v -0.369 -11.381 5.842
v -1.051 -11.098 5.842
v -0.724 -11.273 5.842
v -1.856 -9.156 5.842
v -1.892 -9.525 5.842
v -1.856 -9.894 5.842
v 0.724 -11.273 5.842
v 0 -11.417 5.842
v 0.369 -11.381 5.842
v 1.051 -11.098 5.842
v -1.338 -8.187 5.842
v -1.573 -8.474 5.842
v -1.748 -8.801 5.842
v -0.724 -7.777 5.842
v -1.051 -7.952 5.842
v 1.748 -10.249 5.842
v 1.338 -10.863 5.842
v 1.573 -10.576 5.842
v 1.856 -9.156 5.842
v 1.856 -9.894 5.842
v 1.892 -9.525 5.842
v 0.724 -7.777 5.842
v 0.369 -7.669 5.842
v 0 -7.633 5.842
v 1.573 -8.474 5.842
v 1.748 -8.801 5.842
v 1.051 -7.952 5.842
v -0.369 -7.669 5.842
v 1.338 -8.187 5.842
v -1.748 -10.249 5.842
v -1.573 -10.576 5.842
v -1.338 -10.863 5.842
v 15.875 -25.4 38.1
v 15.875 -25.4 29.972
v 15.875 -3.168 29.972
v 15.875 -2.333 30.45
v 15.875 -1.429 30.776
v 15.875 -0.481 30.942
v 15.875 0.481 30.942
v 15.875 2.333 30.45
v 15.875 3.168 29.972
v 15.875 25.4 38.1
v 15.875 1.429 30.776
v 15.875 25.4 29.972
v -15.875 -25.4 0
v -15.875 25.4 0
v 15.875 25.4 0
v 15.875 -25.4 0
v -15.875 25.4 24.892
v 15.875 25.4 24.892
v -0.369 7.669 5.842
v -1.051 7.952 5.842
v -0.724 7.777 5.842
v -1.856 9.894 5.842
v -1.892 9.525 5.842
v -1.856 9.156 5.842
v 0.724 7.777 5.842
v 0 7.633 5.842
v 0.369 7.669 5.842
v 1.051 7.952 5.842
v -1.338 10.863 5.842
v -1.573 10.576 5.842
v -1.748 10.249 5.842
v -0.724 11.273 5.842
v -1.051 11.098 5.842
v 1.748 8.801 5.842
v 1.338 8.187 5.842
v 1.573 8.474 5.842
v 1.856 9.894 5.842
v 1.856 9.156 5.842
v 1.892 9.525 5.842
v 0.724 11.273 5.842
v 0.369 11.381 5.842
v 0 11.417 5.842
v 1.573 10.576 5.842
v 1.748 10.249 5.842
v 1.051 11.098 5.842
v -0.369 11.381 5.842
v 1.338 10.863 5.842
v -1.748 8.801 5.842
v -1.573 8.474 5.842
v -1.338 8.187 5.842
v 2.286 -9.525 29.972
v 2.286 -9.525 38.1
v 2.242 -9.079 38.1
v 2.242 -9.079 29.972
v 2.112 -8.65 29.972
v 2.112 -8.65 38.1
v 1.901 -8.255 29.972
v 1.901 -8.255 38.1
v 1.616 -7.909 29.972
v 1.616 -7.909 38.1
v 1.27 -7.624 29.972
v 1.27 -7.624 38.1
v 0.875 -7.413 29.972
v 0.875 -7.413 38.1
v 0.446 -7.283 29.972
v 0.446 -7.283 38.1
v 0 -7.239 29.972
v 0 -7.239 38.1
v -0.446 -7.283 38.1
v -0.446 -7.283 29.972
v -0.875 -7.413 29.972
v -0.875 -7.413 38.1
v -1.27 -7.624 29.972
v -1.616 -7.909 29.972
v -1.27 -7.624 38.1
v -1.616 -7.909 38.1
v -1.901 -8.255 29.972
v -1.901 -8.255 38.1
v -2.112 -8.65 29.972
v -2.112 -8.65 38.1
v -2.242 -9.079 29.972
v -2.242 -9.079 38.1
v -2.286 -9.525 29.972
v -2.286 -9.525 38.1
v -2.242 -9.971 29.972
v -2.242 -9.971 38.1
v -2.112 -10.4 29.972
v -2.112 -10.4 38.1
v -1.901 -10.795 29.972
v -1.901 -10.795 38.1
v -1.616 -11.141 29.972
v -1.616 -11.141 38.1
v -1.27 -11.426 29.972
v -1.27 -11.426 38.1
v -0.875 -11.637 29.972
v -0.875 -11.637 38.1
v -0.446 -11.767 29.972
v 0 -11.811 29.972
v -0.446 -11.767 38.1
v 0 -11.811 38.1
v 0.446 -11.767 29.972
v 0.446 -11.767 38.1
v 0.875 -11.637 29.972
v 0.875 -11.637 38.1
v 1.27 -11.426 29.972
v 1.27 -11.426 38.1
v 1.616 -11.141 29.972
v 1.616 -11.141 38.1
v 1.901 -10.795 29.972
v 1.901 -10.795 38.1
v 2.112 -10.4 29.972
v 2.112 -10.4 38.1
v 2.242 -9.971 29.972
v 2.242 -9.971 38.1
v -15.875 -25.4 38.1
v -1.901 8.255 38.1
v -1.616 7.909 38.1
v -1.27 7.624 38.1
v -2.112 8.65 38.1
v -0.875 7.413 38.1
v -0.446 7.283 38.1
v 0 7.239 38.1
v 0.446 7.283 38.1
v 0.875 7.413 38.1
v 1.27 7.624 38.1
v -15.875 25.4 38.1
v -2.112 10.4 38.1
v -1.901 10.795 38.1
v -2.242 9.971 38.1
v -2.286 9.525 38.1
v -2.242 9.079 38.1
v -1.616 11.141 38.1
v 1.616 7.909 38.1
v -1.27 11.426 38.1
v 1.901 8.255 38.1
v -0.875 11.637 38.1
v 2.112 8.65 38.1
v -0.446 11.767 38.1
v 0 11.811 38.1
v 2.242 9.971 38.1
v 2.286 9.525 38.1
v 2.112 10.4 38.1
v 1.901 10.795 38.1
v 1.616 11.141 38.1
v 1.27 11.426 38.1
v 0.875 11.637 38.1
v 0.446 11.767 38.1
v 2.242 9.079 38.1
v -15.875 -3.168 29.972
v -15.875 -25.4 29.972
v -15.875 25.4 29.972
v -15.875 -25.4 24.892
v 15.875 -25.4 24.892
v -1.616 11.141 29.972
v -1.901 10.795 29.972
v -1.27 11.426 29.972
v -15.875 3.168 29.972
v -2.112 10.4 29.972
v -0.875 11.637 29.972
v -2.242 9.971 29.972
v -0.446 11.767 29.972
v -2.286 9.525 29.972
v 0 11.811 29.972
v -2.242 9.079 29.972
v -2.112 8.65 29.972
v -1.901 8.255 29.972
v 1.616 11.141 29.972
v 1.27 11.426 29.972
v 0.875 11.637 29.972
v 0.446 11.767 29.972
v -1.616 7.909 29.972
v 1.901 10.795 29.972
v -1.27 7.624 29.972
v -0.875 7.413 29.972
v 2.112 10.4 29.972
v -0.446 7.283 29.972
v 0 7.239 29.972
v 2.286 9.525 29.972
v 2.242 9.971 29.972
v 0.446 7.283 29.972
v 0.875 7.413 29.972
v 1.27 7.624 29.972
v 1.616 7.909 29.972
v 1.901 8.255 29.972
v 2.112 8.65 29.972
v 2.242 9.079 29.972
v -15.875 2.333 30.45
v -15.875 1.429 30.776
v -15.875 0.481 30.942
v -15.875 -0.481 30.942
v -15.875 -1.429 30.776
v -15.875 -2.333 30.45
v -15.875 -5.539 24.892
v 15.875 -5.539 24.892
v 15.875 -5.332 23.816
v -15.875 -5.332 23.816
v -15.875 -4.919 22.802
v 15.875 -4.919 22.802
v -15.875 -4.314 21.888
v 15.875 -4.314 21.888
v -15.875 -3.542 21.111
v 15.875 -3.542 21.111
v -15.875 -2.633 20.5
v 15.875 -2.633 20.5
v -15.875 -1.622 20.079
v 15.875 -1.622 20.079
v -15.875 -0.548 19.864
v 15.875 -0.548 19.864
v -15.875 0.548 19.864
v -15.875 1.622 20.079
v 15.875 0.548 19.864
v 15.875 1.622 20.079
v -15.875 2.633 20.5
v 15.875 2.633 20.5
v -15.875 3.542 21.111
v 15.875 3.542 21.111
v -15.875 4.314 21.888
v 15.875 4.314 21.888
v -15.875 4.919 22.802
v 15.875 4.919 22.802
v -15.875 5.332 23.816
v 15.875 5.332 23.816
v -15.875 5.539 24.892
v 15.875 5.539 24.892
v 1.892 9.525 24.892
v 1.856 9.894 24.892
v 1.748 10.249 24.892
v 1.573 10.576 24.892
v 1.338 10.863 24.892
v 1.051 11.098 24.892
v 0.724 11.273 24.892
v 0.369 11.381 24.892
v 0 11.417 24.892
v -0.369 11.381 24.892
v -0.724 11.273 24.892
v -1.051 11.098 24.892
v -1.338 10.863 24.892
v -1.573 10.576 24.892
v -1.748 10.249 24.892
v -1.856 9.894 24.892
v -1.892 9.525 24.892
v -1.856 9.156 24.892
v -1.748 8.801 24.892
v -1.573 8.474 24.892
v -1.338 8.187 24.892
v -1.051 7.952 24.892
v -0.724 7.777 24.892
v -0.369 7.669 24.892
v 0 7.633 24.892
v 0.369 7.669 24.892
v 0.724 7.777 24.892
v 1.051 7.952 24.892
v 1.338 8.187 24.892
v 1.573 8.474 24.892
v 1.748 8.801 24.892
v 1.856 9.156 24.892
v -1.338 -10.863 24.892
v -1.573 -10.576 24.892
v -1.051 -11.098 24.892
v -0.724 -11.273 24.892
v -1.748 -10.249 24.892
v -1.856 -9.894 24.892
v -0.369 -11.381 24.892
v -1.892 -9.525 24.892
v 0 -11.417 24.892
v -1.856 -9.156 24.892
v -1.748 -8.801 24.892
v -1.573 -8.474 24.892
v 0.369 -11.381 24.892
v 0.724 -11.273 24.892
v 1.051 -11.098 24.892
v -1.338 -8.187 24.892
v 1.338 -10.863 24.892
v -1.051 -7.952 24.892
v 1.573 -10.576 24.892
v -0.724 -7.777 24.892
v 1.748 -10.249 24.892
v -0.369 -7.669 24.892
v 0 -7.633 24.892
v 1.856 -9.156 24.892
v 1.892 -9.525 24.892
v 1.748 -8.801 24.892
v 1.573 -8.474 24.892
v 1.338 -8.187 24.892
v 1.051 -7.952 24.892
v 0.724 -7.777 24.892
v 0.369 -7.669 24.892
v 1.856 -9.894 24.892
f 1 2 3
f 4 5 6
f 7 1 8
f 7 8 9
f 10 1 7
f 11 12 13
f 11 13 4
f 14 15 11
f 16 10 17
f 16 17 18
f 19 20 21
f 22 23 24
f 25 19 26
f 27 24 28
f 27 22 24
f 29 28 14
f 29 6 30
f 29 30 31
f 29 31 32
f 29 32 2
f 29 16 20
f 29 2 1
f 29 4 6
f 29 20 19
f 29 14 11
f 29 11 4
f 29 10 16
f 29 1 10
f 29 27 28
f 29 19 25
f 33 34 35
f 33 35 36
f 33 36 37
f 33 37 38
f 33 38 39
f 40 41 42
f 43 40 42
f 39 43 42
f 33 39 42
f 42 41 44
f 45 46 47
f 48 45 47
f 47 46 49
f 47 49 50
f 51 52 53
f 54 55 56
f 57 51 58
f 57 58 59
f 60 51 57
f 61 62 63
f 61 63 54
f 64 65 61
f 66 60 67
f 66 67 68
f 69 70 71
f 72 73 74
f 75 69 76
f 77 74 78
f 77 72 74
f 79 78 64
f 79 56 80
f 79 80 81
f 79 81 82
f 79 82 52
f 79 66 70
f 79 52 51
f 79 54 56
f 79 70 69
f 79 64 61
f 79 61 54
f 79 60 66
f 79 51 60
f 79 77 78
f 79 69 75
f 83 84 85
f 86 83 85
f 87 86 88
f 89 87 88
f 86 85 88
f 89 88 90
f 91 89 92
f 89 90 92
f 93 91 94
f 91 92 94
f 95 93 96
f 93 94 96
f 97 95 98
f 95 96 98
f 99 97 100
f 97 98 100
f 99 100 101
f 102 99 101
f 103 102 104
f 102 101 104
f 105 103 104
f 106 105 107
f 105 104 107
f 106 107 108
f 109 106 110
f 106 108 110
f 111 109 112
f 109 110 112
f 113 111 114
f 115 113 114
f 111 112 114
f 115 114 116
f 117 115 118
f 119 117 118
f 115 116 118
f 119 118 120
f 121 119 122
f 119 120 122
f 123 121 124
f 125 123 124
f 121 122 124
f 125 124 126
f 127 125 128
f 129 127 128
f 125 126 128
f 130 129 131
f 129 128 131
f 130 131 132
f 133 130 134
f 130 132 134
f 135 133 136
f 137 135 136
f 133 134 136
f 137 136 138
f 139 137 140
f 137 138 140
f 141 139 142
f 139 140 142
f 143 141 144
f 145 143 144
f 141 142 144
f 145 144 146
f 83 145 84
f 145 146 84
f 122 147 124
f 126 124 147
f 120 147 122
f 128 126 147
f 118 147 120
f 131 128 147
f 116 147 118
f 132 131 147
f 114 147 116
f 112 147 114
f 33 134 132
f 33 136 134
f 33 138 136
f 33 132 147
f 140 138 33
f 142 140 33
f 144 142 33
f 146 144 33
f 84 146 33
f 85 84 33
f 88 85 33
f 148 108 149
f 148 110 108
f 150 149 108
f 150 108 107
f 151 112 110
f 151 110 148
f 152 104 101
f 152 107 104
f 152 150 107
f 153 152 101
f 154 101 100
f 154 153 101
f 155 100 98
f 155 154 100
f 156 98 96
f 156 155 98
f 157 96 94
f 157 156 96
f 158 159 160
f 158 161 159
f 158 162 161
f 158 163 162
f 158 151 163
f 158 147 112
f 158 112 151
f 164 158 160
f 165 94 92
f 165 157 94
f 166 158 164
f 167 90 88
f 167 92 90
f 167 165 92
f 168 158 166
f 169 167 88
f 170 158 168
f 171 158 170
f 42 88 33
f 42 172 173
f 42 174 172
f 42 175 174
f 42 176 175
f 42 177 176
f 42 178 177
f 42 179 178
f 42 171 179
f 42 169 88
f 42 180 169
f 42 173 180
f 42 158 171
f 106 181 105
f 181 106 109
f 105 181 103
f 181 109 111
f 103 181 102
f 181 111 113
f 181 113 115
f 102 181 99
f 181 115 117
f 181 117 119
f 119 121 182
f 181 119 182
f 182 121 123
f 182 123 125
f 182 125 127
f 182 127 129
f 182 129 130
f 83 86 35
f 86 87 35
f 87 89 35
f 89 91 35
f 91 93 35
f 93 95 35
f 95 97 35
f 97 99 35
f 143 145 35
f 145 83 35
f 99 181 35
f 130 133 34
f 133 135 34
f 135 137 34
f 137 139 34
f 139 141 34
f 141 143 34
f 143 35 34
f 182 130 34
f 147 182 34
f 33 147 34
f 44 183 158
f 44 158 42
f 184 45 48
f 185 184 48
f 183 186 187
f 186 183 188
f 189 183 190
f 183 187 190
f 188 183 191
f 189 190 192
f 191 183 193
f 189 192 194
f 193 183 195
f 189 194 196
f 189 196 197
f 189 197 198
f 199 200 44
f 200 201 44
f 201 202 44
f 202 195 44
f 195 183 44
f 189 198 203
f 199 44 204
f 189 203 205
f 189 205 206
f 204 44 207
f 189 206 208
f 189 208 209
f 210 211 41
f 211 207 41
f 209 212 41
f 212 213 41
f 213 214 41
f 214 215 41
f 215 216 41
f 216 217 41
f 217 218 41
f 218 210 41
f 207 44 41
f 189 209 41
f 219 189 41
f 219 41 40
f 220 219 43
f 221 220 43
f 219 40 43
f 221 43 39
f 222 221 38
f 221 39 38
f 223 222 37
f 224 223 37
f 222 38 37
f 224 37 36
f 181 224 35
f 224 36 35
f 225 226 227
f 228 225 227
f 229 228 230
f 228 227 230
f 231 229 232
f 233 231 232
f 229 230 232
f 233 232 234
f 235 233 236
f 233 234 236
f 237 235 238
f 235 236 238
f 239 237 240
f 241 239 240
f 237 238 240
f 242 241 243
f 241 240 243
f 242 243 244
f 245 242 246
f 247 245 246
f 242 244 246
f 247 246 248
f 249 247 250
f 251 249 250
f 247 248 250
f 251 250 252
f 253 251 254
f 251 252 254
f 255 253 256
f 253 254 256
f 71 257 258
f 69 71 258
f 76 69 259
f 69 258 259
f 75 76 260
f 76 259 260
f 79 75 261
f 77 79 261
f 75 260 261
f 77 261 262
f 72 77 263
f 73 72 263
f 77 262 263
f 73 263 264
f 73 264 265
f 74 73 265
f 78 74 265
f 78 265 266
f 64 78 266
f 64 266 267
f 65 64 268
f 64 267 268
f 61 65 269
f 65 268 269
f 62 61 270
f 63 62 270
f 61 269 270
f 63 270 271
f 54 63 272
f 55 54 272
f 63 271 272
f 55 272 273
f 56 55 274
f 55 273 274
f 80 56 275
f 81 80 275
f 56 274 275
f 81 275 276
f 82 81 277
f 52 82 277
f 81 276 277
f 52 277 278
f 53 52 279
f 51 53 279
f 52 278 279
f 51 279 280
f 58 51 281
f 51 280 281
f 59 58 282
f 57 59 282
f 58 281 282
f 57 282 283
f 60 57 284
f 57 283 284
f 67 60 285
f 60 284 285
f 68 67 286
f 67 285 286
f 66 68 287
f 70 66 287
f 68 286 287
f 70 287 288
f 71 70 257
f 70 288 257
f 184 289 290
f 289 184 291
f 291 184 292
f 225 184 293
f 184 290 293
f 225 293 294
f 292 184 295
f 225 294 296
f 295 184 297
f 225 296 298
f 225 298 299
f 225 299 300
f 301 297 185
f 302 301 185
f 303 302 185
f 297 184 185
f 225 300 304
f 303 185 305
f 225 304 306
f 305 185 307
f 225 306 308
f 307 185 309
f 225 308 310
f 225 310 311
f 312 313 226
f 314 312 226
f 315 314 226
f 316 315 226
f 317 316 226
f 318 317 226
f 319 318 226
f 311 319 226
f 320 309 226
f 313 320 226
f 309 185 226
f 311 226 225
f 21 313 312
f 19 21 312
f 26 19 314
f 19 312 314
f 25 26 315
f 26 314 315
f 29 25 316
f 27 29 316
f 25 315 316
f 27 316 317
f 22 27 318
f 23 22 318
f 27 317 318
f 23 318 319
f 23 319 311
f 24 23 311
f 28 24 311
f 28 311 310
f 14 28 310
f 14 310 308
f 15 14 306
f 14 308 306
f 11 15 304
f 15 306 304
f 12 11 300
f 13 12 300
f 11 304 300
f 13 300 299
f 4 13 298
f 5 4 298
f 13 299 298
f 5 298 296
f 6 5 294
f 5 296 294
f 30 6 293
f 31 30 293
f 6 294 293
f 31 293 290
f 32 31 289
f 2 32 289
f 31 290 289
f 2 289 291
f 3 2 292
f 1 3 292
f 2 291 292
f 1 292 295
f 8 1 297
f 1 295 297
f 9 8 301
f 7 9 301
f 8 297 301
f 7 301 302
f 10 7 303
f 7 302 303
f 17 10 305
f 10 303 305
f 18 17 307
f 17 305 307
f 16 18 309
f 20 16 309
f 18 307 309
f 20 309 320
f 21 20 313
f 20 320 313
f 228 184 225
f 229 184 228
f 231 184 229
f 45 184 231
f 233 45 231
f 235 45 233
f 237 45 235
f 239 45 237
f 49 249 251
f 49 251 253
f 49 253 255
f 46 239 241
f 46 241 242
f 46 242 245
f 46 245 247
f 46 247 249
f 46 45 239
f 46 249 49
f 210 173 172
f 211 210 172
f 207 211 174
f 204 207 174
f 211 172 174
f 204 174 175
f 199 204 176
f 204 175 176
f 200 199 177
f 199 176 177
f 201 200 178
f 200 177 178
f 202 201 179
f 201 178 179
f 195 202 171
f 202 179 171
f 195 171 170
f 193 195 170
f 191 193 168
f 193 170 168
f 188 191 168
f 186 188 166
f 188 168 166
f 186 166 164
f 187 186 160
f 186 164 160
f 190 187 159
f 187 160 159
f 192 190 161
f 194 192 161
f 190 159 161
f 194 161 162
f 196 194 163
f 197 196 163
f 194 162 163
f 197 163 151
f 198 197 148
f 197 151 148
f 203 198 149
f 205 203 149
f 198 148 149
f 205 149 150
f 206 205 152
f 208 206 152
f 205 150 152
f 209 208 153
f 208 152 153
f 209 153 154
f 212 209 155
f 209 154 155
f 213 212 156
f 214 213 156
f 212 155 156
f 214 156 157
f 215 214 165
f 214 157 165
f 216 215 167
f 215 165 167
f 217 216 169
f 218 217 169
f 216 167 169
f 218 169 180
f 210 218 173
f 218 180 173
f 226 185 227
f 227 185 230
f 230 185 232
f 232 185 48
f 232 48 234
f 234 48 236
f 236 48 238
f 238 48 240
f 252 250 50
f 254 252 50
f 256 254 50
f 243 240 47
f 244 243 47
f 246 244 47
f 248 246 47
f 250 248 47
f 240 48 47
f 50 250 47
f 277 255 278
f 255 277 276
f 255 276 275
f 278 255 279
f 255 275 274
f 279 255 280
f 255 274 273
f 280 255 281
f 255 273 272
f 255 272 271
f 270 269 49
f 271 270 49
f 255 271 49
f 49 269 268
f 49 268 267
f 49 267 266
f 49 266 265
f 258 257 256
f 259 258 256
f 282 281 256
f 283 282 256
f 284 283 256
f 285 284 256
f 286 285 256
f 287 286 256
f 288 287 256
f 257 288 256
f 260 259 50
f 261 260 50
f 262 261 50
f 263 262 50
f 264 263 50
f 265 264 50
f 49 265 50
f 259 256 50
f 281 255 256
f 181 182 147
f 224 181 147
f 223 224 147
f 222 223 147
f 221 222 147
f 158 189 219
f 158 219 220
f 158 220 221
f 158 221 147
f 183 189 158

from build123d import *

# Parameters (mm, degrees)
F0_W     = 31.75
F0_H     = 50.8
F1_DEPTH = 38.1
F3_DEPTH = 31.751
F4_R     = 2.286
F5_DEPTH = 8.128
F6_R     = 1.8923
F7_DEPTH = 19.05


with BuildPart() as f1:
    # F0 (on Top) → F1 (new body)
    with BuildSketch(Plane.XY):
        Rectangle(F0_W, F0_H)
    extrude(amount=F1_DEPTH)

    # F2 (on face) → F3 (cut, through all)
    with BuildSketch(Plane.YZ.offset(15.875)):
        with BuildLine():
            Line((-25.4, 24.892), (-5.539355, 24.892))
            ThreePointArc((-5.539355, 24.892), (0, 19.8374), (5.539355, 24.892))
            Line((5.539355, 24.892), (25.4, 24.892))
            Line((25.4, 24.892), (25.4, 29.972))
            Line((25.4, 29.972), (3.168491, 29.972))
            ThreePointArc((3.168491, 29.972), (0, 30.9626), (-3.168491, 29.972))
            Line((-3.168491, 29.972), (-25.4, 29.972))
            Line((-25.4, 29.972), (-25.4, 24.892))
        make_face()
    extrude(amount=-F3_DEPTH, mode=Mode.SUBTRACT)

    # F4 (on face) → F5 (cut, through all)
    with BuildSketch(Plane.XY.offset(38.1)):
        with Locations((0, 9.525)):
            Circle(F4_R)
        with Locations((0, -9.525)):
            Circle(F4_R)
    extrude(amount=-F5_DEPTH, mode=Mode.SUBTRACT)

    # F6 (on face) → F7 (cut)
    with BuildSketch(Plane.XY.offset(24.892)):
        with Locations((0, 9.525)):
            Circle(F6_R)
        with Locations((0, -9.525)):
            Circle(F6_R)
    extrude(amount=-F7_DEPTH, mode=Mode.SUBTRACT)


solid = f1.part
